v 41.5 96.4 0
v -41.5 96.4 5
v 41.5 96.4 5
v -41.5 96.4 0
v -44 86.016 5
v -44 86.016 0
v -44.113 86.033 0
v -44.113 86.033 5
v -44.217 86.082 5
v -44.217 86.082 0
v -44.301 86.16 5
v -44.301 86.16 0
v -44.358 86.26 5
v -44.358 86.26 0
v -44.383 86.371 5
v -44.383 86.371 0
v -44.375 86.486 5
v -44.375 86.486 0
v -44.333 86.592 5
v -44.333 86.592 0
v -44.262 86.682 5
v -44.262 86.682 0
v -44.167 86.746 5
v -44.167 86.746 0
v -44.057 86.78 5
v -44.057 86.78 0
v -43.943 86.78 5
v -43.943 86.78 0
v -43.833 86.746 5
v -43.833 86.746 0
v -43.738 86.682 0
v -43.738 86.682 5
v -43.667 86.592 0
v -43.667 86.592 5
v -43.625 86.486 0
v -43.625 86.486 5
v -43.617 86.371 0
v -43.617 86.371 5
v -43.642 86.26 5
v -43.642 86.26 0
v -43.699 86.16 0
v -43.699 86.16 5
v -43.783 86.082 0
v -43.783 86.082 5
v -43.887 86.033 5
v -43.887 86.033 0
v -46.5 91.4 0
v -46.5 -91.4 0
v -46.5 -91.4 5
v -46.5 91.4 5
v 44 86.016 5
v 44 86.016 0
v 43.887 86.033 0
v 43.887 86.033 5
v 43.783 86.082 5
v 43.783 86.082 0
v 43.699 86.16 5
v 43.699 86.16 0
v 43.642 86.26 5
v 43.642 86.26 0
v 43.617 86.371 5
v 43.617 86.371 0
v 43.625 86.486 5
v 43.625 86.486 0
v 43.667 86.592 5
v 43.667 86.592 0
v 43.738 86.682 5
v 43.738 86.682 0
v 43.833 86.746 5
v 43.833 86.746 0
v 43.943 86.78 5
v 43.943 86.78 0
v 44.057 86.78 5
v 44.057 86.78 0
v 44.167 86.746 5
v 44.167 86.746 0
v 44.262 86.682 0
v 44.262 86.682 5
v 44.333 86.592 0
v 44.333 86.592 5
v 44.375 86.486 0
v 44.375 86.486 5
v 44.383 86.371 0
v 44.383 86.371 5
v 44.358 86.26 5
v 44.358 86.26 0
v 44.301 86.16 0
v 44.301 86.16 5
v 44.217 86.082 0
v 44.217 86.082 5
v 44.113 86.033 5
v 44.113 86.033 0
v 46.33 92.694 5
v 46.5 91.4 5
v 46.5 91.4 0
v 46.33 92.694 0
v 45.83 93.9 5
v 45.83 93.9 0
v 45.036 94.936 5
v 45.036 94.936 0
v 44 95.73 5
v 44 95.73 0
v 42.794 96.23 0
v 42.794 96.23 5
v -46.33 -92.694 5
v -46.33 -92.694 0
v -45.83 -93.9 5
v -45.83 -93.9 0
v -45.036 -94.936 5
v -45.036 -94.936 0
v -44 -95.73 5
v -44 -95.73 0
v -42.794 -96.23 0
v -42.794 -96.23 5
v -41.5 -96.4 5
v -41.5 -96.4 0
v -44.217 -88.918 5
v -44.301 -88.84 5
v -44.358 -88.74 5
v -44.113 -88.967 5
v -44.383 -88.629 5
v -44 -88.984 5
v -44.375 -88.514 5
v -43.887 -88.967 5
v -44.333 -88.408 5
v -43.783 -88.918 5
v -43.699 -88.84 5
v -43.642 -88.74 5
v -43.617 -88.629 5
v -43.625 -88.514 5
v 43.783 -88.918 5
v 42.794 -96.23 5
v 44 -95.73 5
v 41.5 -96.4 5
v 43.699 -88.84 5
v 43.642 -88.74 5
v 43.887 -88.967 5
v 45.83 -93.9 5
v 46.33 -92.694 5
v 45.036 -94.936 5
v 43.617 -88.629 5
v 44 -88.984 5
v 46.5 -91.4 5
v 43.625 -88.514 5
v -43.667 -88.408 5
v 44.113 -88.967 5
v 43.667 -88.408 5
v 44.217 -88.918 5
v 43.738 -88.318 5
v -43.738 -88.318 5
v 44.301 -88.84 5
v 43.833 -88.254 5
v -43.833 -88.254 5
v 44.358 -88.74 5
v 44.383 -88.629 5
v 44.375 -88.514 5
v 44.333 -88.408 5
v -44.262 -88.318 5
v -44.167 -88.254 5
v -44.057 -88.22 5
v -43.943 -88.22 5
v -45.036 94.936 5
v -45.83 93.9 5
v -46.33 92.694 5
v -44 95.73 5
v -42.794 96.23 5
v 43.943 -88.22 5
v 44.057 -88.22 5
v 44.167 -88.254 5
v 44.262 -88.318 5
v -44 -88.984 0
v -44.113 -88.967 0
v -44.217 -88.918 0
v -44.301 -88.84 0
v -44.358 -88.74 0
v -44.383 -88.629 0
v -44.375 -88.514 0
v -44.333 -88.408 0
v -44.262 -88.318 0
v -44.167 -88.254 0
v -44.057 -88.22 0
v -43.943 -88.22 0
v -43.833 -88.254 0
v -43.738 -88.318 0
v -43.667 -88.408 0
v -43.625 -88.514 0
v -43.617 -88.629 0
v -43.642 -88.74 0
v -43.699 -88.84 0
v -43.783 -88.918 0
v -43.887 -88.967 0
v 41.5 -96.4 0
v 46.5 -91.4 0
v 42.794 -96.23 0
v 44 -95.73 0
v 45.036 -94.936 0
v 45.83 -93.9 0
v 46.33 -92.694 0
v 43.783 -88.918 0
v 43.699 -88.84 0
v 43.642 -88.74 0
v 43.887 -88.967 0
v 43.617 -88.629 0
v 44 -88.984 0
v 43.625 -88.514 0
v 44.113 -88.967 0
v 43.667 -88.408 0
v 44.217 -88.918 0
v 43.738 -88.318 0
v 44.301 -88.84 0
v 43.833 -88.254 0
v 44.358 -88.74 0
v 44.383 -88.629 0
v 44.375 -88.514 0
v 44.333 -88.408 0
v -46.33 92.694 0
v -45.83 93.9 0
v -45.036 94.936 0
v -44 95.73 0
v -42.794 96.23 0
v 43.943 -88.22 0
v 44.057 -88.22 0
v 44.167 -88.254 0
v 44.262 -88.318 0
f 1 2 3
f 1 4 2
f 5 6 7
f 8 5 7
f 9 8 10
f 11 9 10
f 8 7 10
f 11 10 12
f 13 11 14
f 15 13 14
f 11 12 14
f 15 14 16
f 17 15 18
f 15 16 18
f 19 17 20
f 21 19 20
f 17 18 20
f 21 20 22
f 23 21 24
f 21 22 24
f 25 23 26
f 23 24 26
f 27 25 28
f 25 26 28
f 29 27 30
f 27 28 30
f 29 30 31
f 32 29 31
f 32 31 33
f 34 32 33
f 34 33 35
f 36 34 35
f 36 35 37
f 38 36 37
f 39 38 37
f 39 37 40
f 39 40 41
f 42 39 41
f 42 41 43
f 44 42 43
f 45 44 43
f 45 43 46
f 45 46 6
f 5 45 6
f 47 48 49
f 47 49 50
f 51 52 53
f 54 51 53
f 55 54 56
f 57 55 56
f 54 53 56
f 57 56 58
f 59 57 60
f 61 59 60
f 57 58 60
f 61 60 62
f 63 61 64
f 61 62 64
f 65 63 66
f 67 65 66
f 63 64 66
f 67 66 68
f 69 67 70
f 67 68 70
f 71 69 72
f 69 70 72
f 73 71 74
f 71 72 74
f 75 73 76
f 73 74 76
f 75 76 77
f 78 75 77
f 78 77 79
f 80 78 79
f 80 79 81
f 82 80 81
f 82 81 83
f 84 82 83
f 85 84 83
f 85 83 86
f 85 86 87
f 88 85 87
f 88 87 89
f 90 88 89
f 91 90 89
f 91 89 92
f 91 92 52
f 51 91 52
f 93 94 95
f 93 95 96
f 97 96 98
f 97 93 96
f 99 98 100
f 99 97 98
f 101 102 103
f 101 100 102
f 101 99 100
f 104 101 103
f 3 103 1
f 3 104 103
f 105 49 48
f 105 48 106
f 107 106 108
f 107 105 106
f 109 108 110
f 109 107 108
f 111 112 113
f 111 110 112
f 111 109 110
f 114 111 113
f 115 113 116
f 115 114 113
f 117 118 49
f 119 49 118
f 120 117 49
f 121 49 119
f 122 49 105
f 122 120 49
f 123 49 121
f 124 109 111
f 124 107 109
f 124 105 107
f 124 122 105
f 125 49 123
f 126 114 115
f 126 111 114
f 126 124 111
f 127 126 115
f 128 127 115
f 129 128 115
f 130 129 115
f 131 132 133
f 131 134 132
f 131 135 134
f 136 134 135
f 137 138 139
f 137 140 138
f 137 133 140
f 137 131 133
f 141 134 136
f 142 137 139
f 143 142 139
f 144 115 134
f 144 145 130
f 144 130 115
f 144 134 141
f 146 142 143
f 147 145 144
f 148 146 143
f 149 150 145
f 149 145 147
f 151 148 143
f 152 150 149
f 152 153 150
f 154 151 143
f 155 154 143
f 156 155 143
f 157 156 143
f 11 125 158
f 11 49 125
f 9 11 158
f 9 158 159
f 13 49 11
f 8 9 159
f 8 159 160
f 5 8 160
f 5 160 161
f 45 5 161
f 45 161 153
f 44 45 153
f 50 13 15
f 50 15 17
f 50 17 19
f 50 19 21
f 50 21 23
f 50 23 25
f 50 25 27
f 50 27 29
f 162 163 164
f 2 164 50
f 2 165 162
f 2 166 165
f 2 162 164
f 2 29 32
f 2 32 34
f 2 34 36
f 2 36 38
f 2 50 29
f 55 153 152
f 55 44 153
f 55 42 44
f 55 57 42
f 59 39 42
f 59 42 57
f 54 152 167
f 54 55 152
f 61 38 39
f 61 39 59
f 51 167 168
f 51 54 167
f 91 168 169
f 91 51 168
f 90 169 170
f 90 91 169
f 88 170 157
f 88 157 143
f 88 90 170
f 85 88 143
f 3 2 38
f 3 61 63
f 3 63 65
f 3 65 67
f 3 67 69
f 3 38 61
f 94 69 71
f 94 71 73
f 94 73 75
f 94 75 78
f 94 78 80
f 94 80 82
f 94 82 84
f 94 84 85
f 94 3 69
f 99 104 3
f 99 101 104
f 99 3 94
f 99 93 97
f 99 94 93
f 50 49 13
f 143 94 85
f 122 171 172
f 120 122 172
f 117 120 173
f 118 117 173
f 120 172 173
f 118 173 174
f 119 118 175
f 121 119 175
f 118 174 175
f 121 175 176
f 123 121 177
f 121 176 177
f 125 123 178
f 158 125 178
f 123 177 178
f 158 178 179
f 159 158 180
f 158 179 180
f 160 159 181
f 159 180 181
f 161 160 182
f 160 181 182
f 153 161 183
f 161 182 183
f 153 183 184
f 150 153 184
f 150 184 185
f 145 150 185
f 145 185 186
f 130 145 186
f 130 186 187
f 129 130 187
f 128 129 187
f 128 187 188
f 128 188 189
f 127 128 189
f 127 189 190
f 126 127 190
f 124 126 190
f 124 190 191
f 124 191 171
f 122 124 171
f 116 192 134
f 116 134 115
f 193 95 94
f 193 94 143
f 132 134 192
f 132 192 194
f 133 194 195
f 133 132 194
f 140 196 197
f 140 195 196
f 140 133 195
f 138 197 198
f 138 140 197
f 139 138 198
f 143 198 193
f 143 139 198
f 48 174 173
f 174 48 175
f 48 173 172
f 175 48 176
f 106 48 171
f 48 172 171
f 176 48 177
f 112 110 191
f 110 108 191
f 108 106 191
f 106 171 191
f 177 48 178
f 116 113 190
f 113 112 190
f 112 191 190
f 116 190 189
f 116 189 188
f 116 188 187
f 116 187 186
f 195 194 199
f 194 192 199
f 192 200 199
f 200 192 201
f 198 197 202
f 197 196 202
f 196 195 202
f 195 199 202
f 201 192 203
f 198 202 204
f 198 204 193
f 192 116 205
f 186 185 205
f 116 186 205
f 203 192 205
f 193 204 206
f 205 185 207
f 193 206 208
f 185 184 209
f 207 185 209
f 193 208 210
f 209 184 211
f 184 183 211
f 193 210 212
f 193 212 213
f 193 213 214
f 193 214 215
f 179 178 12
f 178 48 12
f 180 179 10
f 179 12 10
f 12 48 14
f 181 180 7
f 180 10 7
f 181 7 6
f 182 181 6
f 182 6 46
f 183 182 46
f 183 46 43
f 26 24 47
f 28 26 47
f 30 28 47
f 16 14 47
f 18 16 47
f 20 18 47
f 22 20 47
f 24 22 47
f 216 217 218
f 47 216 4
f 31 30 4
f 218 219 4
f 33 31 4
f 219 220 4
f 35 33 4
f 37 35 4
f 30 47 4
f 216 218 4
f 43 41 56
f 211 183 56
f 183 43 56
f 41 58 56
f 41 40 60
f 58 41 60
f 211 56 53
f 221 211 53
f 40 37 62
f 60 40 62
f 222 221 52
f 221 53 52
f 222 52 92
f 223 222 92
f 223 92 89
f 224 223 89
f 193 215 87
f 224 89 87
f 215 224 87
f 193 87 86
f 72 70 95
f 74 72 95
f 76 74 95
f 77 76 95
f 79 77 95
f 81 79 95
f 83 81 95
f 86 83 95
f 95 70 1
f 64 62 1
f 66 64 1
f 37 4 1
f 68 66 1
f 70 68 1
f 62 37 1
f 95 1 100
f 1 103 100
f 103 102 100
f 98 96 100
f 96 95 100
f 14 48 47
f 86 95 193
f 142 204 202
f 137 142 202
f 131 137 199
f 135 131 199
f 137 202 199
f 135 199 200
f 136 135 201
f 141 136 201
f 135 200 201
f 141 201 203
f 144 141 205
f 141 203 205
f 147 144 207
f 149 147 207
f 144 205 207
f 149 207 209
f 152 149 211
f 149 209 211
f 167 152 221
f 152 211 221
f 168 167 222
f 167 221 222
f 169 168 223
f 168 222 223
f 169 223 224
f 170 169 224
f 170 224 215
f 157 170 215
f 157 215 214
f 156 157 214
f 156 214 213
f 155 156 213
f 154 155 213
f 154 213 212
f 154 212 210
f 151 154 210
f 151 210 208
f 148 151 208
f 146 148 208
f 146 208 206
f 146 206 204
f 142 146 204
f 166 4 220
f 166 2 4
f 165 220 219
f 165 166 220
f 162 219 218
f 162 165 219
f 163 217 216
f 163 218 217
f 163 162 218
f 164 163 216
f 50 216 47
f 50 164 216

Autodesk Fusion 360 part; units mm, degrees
sketch "Boceto1" plane through (0, 0, 0) normal (0, 0, 1) x (1, 0, 0)
  line L0 (46.5, -96.4) -> (-46.5, -96.4)
  line L1 (-46.5, -96.4) -> (-46.5, 96.4)
  line L2 (-46.5, 96.4) -> (46.5, 96.4)
  line L3 (46.5, 96.4) -> (46.5, -96.4)
  line L4 (46.5, -96.4) -> (-46.5, 96.4) construction
  line L5 (-46.5, -96.4) -> (46.5, 96.4) construction
  dimension "d1" = 93
  dimension "d2" = 192.8
extrude "Extruir1" add sketch "Boceto1" along normal blind 5
fillet "Empalme1" radius 5 1 edges at (-46.5, 96.4, 2.5)
fillet "Empalme2" radius 5 1 edges at (46.5, 96.4, 2.5)
fillet "Empalme3" radius 5 1 edges at (46.5, -96.4, 2.5)
fillet "Empalme4" radius 5 1 edges at (-46.5, -96.4, 2.5)
sketch "Boceto2" plane through (0, 0, 5) normal (0, 0, 1) x (-1, 0, 0)
  arc A0 (46.5, 91.4) -> (41.5, 96.4) centre (41.5, 91.4) ccw
  line L0 (41.5, 96.4) -> (-41.5, 96.4)
  arc A1 (-41.5, 96.4) -> (-46.5, 91.4) centre (-41.5, 91.4) ccw
  line L1 (-46.5, 91.4) -> (-46.5, -91.4)
  arc A2 (-46.5, -91.4) -> (-41.5, -96.4) centre (-41.5, -91.4) ccw
  line L2 (-41.5, -96.4) -> (41.5, -96.4)
  arc A3 (41.5, -96.4) -> (46.5, -91.4) centre (41.5, -91.4) ccw
  line L3 (46.5, -91.4) -> (46.5, 91.4)
  line L4 (-46.5, -96.4) -> (-46.5, -86.4)
  line L5 (-46.5, -86.4) -> (-44, -86.4)
  line L6 (-44, -86.4) -> (44, -86.4)
  line L7 (44, -86.4) -> (44, 88.6)
  line L8 (44, 88.6) -> (-44, 88.6)
  line L9 (-44, 88.6) -> (-44, -86.4)
  dimension "d13" = 10
  dimension "d14" = 2.5
  dimension "d15" = 88
  dimension "d16" = 175
  dimension "d17" = 88
hole "Agujero1" at (-44, -88.6, 5) at (-44, 86.4, 5) at (44, 86.4, 5) at (44, -88.6, 5) direction (0, 0, -1) diameter 0.769 depth 5 tip angle 118
